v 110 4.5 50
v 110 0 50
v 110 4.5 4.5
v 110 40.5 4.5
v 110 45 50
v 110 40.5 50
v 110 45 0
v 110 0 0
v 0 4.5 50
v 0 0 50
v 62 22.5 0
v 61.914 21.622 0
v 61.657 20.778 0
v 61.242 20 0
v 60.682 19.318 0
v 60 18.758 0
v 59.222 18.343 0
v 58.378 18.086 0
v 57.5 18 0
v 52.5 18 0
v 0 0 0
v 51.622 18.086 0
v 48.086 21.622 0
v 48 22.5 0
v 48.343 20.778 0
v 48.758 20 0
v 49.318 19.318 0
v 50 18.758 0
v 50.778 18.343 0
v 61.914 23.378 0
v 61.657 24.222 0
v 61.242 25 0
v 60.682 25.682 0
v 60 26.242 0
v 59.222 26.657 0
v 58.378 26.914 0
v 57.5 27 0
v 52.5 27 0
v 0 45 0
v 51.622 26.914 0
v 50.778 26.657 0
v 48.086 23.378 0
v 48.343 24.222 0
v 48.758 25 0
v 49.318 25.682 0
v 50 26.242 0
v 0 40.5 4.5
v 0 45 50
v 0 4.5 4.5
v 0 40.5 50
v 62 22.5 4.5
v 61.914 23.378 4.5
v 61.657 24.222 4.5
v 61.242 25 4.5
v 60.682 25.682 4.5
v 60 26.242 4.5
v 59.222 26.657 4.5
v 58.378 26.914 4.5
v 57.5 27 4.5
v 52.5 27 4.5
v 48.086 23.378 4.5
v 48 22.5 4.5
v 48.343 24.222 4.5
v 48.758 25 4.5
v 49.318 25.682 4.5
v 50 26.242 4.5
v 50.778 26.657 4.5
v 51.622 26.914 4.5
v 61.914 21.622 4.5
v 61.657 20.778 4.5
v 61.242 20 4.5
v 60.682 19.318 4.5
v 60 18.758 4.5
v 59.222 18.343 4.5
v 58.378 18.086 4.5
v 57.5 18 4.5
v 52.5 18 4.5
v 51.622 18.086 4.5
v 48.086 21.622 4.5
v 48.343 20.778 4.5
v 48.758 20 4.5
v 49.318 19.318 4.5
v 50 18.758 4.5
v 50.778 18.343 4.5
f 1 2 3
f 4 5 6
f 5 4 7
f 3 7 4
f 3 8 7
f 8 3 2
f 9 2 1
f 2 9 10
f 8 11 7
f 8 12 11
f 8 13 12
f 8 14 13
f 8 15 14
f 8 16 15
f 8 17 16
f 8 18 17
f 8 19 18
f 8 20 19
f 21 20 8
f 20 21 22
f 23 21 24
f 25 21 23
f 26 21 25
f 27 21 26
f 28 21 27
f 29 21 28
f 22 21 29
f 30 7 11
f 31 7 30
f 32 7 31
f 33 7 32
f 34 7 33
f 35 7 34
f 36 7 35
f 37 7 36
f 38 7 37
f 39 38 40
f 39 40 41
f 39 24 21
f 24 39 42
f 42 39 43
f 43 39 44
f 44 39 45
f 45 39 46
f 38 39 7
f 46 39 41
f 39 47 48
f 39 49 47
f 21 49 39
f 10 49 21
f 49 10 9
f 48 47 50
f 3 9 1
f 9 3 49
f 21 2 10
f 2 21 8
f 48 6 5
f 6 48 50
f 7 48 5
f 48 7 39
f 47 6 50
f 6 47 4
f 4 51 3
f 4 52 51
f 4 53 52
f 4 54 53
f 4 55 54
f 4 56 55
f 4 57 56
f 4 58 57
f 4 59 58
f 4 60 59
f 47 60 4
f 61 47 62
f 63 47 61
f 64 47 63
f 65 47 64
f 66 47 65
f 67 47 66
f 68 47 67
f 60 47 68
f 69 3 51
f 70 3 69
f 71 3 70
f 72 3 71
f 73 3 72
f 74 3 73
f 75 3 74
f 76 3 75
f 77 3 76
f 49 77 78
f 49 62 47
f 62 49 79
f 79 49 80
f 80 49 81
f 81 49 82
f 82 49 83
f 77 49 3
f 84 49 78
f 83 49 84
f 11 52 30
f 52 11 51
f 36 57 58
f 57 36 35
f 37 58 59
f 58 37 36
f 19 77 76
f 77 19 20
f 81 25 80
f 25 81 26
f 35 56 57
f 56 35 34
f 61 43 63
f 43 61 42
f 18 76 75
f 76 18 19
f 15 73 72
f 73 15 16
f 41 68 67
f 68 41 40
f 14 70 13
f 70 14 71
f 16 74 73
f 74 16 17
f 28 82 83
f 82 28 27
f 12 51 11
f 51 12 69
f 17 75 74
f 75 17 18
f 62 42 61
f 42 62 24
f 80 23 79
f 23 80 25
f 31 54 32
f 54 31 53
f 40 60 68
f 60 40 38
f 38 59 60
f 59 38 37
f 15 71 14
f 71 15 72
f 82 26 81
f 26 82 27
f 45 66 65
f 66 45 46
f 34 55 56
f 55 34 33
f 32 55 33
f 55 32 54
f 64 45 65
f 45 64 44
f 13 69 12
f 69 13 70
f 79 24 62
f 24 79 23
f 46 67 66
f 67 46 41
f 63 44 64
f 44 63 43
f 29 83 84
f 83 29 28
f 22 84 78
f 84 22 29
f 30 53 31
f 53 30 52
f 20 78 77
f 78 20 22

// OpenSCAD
$fn = 32;

// ----------------------------------------------------------------------
// U-bracket: 110 x 45 x 50 mm
// ----------------------------------------------------------------------

// --- parameters (mm) ---
base_len = 110;           // outer length, X
channel_w = 45;           // outer width, Y
upright_h = 50;           // upright height, Z
mat_t = 4.5;              // wall thickness
hole_d = 9;               // clearance for M8
slot_l = 14;              // slot length

module hole_z(px, py) {
  translate([px, py, -2.5]) cylinder(h = mat_t + 5, d = hole_d);
}
module hole_y_pz(pz) {
  /* through both uprights along Y */
  translate([0, -2.5, pz]) rotate([-90, 0, 0]) cylinder(h = channel_w + 5, d = hole_d);
}
module slot_z(px, py) {
  hull() {
    translate([px - (slot_l - hole_d) / 2, py, -2.5]) cylinder(h = mat_t + 5, d = hole_d);
    translate([px + (slot_l - hole_d) / 2, py, -2.5]) cylinder(h = mat_t + 5, d = hole_d);
  }
}

module base() {
  cube([base_len, channel_w, mat_t]);
}

module uprights() {
  cube([base_len, mat_t, upright_h]);
  translate([0, channel_w - mat_t, 0]) cube([base_len, mat_t, upright_h]);
}

difference() {
  union() {
    base();
    uprights();
  }
  slot_z(55, 22.5);
}
